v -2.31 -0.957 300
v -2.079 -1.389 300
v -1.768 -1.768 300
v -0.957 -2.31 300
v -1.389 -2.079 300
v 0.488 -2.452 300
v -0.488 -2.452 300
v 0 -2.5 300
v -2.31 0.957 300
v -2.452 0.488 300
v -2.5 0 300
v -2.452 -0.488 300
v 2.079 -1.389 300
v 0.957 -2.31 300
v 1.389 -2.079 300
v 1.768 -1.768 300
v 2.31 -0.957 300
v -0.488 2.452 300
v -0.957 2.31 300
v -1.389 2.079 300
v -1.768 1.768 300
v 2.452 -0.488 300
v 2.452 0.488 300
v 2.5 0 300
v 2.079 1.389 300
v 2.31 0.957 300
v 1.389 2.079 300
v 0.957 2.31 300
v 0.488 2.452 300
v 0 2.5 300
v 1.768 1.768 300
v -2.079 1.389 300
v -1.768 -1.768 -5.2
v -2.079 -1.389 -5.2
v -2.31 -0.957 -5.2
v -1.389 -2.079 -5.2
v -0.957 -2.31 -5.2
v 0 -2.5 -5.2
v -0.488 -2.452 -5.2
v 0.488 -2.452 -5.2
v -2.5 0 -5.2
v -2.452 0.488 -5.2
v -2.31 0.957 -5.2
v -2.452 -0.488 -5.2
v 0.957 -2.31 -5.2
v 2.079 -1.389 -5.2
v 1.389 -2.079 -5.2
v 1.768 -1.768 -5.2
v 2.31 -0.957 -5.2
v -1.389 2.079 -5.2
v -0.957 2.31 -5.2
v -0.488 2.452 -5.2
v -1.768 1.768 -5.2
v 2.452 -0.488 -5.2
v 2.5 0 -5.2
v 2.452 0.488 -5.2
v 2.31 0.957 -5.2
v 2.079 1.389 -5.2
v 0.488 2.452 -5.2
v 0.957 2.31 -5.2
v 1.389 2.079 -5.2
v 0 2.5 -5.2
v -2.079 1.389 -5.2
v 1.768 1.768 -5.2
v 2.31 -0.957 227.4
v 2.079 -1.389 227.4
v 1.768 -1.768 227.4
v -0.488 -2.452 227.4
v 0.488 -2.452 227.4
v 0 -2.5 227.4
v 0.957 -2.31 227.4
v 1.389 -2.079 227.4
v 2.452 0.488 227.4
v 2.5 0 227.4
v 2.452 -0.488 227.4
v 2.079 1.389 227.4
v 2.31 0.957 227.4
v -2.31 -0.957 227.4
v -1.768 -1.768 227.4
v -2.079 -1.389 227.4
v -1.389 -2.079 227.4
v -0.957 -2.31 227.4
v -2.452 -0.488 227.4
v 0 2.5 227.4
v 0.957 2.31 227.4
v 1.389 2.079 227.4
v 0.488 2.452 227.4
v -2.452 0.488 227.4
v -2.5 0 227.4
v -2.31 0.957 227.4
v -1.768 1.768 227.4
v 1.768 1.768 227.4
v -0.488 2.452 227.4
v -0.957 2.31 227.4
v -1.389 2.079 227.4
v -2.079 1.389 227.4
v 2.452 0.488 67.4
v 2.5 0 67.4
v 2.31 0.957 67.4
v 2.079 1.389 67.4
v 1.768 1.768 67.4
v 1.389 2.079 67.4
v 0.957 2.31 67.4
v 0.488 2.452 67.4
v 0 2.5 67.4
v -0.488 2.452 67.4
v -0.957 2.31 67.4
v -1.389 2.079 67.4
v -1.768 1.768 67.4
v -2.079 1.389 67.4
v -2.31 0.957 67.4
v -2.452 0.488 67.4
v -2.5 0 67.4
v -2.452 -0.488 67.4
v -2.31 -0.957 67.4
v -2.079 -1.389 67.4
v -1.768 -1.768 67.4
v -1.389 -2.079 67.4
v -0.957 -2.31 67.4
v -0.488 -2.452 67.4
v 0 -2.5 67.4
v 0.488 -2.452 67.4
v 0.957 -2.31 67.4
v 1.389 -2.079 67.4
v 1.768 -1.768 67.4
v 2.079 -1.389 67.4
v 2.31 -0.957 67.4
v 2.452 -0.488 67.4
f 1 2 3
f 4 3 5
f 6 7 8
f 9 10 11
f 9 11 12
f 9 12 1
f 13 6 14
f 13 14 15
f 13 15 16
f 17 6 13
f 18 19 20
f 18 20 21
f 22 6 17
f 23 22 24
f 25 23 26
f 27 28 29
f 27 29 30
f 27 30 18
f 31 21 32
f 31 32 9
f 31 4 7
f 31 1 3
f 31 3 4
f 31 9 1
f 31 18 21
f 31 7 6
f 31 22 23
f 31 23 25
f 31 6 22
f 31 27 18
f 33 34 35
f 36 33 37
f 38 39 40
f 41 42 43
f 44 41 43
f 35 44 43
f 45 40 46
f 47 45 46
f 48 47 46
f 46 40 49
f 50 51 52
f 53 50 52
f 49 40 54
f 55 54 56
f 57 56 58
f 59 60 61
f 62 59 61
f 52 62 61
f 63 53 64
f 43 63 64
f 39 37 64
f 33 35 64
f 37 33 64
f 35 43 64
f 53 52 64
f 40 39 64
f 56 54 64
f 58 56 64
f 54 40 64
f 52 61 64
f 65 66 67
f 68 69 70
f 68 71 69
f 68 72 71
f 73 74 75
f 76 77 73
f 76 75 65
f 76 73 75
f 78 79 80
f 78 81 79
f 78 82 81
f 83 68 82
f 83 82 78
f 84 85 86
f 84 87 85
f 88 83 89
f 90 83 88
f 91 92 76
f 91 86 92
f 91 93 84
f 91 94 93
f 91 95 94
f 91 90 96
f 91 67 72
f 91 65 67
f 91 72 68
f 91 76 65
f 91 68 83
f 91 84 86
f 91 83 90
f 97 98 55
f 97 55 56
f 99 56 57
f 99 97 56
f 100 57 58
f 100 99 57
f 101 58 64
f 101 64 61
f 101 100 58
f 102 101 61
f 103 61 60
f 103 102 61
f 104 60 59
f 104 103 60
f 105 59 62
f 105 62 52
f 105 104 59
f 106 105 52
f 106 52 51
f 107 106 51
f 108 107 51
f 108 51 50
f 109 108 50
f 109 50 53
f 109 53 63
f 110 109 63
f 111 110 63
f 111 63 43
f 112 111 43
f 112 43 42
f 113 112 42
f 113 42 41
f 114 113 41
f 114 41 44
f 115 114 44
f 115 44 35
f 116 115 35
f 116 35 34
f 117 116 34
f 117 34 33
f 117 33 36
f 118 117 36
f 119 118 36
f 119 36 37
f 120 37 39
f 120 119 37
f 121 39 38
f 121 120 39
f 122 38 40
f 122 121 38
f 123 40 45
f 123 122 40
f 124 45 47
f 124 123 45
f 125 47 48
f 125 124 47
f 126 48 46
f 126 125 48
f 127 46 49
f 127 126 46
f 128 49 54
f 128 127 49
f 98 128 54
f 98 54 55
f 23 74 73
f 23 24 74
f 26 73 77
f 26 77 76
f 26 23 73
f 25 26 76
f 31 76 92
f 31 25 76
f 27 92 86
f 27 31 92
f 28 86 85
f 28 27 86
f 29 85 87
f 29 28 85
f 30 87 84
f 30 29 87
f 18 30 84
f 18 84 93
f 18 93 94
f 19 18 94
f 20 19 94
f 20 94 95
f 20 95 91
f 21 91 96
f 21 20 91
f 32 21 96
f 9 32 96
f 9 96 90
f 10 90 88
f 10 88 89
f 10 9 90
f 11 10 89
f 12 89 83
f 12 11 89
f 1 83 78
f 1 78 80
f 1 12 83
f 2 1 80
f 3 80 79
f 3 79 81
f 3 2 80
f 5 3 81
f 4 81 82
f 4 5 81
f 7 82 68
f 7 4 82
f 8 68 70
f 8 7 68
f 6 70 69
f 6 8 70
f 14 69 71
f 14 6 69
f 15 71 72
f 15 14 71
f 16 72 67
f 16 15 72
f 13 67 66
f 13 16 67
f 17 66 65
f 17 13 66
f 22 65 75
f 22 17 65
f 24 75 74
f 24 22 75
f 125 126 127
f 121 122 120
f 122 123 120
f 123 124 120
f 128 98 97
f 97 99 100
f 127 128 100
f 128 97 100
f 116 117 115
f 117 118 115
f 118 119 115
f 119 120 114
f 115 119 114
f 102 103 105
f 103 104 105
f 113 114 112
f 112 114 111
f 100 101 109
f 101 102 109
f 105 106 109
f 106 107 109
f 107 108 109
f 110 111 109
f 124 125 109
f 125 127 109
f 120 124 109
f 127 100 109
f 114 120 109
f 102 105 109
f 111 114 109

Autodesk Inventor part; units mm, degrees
ref_plane "РабПлоскость1" through (-33.1795, -18.2761, -5.1998) normal (0, 0, 1) x (0.9782, 0.2076, 0)
ref_plane "РабПлоскость2" through (-33.1795, -18.2761, -5.1998) normal (0, 0, 1) x (0.9782, 0.2076, 0)
sketch "Эскиз1" plane through (0, 0, 0) normal (0, 0, 1) x (1, 0, 0)
  circle A0 centre (0, 0) radius 2.5
  dimension "d0" = 5
extrude "Выдавливание1" add sketch "Эскиз1" against normal up to surface (5.1998 mm away)
sketch "Эскиз2" plane through (0, 0, 0) normal (0, 0, 1) x (1, 0, 0)
  circle A0 centre (0, 0) radius 2.5
ref_plane "РабПлоскость3" through (-19.9176, -17.3177, 300) normal (0, 0, 1) x (0.988, -0.1545, 0)
extrude "Выдавливание2" add sketch "Эскиз2" along normal up to surface (300 mm away)
ref_plane "РабПлоскость4" through (0, 0, 147.4001) normal (0, 0, -1) x (-1, 0, 0)
sketch "Эскиз3" plane through (0, 0, 147.4001) normal (0, 0, -1) x (-1, 0, 0)
  circle A0 centre (0, 0) radius 9.8212
extrude "Выдавливание3" cut sketch "Эскиз3" along normal mid plane 160
properties part number "ось колес2"
